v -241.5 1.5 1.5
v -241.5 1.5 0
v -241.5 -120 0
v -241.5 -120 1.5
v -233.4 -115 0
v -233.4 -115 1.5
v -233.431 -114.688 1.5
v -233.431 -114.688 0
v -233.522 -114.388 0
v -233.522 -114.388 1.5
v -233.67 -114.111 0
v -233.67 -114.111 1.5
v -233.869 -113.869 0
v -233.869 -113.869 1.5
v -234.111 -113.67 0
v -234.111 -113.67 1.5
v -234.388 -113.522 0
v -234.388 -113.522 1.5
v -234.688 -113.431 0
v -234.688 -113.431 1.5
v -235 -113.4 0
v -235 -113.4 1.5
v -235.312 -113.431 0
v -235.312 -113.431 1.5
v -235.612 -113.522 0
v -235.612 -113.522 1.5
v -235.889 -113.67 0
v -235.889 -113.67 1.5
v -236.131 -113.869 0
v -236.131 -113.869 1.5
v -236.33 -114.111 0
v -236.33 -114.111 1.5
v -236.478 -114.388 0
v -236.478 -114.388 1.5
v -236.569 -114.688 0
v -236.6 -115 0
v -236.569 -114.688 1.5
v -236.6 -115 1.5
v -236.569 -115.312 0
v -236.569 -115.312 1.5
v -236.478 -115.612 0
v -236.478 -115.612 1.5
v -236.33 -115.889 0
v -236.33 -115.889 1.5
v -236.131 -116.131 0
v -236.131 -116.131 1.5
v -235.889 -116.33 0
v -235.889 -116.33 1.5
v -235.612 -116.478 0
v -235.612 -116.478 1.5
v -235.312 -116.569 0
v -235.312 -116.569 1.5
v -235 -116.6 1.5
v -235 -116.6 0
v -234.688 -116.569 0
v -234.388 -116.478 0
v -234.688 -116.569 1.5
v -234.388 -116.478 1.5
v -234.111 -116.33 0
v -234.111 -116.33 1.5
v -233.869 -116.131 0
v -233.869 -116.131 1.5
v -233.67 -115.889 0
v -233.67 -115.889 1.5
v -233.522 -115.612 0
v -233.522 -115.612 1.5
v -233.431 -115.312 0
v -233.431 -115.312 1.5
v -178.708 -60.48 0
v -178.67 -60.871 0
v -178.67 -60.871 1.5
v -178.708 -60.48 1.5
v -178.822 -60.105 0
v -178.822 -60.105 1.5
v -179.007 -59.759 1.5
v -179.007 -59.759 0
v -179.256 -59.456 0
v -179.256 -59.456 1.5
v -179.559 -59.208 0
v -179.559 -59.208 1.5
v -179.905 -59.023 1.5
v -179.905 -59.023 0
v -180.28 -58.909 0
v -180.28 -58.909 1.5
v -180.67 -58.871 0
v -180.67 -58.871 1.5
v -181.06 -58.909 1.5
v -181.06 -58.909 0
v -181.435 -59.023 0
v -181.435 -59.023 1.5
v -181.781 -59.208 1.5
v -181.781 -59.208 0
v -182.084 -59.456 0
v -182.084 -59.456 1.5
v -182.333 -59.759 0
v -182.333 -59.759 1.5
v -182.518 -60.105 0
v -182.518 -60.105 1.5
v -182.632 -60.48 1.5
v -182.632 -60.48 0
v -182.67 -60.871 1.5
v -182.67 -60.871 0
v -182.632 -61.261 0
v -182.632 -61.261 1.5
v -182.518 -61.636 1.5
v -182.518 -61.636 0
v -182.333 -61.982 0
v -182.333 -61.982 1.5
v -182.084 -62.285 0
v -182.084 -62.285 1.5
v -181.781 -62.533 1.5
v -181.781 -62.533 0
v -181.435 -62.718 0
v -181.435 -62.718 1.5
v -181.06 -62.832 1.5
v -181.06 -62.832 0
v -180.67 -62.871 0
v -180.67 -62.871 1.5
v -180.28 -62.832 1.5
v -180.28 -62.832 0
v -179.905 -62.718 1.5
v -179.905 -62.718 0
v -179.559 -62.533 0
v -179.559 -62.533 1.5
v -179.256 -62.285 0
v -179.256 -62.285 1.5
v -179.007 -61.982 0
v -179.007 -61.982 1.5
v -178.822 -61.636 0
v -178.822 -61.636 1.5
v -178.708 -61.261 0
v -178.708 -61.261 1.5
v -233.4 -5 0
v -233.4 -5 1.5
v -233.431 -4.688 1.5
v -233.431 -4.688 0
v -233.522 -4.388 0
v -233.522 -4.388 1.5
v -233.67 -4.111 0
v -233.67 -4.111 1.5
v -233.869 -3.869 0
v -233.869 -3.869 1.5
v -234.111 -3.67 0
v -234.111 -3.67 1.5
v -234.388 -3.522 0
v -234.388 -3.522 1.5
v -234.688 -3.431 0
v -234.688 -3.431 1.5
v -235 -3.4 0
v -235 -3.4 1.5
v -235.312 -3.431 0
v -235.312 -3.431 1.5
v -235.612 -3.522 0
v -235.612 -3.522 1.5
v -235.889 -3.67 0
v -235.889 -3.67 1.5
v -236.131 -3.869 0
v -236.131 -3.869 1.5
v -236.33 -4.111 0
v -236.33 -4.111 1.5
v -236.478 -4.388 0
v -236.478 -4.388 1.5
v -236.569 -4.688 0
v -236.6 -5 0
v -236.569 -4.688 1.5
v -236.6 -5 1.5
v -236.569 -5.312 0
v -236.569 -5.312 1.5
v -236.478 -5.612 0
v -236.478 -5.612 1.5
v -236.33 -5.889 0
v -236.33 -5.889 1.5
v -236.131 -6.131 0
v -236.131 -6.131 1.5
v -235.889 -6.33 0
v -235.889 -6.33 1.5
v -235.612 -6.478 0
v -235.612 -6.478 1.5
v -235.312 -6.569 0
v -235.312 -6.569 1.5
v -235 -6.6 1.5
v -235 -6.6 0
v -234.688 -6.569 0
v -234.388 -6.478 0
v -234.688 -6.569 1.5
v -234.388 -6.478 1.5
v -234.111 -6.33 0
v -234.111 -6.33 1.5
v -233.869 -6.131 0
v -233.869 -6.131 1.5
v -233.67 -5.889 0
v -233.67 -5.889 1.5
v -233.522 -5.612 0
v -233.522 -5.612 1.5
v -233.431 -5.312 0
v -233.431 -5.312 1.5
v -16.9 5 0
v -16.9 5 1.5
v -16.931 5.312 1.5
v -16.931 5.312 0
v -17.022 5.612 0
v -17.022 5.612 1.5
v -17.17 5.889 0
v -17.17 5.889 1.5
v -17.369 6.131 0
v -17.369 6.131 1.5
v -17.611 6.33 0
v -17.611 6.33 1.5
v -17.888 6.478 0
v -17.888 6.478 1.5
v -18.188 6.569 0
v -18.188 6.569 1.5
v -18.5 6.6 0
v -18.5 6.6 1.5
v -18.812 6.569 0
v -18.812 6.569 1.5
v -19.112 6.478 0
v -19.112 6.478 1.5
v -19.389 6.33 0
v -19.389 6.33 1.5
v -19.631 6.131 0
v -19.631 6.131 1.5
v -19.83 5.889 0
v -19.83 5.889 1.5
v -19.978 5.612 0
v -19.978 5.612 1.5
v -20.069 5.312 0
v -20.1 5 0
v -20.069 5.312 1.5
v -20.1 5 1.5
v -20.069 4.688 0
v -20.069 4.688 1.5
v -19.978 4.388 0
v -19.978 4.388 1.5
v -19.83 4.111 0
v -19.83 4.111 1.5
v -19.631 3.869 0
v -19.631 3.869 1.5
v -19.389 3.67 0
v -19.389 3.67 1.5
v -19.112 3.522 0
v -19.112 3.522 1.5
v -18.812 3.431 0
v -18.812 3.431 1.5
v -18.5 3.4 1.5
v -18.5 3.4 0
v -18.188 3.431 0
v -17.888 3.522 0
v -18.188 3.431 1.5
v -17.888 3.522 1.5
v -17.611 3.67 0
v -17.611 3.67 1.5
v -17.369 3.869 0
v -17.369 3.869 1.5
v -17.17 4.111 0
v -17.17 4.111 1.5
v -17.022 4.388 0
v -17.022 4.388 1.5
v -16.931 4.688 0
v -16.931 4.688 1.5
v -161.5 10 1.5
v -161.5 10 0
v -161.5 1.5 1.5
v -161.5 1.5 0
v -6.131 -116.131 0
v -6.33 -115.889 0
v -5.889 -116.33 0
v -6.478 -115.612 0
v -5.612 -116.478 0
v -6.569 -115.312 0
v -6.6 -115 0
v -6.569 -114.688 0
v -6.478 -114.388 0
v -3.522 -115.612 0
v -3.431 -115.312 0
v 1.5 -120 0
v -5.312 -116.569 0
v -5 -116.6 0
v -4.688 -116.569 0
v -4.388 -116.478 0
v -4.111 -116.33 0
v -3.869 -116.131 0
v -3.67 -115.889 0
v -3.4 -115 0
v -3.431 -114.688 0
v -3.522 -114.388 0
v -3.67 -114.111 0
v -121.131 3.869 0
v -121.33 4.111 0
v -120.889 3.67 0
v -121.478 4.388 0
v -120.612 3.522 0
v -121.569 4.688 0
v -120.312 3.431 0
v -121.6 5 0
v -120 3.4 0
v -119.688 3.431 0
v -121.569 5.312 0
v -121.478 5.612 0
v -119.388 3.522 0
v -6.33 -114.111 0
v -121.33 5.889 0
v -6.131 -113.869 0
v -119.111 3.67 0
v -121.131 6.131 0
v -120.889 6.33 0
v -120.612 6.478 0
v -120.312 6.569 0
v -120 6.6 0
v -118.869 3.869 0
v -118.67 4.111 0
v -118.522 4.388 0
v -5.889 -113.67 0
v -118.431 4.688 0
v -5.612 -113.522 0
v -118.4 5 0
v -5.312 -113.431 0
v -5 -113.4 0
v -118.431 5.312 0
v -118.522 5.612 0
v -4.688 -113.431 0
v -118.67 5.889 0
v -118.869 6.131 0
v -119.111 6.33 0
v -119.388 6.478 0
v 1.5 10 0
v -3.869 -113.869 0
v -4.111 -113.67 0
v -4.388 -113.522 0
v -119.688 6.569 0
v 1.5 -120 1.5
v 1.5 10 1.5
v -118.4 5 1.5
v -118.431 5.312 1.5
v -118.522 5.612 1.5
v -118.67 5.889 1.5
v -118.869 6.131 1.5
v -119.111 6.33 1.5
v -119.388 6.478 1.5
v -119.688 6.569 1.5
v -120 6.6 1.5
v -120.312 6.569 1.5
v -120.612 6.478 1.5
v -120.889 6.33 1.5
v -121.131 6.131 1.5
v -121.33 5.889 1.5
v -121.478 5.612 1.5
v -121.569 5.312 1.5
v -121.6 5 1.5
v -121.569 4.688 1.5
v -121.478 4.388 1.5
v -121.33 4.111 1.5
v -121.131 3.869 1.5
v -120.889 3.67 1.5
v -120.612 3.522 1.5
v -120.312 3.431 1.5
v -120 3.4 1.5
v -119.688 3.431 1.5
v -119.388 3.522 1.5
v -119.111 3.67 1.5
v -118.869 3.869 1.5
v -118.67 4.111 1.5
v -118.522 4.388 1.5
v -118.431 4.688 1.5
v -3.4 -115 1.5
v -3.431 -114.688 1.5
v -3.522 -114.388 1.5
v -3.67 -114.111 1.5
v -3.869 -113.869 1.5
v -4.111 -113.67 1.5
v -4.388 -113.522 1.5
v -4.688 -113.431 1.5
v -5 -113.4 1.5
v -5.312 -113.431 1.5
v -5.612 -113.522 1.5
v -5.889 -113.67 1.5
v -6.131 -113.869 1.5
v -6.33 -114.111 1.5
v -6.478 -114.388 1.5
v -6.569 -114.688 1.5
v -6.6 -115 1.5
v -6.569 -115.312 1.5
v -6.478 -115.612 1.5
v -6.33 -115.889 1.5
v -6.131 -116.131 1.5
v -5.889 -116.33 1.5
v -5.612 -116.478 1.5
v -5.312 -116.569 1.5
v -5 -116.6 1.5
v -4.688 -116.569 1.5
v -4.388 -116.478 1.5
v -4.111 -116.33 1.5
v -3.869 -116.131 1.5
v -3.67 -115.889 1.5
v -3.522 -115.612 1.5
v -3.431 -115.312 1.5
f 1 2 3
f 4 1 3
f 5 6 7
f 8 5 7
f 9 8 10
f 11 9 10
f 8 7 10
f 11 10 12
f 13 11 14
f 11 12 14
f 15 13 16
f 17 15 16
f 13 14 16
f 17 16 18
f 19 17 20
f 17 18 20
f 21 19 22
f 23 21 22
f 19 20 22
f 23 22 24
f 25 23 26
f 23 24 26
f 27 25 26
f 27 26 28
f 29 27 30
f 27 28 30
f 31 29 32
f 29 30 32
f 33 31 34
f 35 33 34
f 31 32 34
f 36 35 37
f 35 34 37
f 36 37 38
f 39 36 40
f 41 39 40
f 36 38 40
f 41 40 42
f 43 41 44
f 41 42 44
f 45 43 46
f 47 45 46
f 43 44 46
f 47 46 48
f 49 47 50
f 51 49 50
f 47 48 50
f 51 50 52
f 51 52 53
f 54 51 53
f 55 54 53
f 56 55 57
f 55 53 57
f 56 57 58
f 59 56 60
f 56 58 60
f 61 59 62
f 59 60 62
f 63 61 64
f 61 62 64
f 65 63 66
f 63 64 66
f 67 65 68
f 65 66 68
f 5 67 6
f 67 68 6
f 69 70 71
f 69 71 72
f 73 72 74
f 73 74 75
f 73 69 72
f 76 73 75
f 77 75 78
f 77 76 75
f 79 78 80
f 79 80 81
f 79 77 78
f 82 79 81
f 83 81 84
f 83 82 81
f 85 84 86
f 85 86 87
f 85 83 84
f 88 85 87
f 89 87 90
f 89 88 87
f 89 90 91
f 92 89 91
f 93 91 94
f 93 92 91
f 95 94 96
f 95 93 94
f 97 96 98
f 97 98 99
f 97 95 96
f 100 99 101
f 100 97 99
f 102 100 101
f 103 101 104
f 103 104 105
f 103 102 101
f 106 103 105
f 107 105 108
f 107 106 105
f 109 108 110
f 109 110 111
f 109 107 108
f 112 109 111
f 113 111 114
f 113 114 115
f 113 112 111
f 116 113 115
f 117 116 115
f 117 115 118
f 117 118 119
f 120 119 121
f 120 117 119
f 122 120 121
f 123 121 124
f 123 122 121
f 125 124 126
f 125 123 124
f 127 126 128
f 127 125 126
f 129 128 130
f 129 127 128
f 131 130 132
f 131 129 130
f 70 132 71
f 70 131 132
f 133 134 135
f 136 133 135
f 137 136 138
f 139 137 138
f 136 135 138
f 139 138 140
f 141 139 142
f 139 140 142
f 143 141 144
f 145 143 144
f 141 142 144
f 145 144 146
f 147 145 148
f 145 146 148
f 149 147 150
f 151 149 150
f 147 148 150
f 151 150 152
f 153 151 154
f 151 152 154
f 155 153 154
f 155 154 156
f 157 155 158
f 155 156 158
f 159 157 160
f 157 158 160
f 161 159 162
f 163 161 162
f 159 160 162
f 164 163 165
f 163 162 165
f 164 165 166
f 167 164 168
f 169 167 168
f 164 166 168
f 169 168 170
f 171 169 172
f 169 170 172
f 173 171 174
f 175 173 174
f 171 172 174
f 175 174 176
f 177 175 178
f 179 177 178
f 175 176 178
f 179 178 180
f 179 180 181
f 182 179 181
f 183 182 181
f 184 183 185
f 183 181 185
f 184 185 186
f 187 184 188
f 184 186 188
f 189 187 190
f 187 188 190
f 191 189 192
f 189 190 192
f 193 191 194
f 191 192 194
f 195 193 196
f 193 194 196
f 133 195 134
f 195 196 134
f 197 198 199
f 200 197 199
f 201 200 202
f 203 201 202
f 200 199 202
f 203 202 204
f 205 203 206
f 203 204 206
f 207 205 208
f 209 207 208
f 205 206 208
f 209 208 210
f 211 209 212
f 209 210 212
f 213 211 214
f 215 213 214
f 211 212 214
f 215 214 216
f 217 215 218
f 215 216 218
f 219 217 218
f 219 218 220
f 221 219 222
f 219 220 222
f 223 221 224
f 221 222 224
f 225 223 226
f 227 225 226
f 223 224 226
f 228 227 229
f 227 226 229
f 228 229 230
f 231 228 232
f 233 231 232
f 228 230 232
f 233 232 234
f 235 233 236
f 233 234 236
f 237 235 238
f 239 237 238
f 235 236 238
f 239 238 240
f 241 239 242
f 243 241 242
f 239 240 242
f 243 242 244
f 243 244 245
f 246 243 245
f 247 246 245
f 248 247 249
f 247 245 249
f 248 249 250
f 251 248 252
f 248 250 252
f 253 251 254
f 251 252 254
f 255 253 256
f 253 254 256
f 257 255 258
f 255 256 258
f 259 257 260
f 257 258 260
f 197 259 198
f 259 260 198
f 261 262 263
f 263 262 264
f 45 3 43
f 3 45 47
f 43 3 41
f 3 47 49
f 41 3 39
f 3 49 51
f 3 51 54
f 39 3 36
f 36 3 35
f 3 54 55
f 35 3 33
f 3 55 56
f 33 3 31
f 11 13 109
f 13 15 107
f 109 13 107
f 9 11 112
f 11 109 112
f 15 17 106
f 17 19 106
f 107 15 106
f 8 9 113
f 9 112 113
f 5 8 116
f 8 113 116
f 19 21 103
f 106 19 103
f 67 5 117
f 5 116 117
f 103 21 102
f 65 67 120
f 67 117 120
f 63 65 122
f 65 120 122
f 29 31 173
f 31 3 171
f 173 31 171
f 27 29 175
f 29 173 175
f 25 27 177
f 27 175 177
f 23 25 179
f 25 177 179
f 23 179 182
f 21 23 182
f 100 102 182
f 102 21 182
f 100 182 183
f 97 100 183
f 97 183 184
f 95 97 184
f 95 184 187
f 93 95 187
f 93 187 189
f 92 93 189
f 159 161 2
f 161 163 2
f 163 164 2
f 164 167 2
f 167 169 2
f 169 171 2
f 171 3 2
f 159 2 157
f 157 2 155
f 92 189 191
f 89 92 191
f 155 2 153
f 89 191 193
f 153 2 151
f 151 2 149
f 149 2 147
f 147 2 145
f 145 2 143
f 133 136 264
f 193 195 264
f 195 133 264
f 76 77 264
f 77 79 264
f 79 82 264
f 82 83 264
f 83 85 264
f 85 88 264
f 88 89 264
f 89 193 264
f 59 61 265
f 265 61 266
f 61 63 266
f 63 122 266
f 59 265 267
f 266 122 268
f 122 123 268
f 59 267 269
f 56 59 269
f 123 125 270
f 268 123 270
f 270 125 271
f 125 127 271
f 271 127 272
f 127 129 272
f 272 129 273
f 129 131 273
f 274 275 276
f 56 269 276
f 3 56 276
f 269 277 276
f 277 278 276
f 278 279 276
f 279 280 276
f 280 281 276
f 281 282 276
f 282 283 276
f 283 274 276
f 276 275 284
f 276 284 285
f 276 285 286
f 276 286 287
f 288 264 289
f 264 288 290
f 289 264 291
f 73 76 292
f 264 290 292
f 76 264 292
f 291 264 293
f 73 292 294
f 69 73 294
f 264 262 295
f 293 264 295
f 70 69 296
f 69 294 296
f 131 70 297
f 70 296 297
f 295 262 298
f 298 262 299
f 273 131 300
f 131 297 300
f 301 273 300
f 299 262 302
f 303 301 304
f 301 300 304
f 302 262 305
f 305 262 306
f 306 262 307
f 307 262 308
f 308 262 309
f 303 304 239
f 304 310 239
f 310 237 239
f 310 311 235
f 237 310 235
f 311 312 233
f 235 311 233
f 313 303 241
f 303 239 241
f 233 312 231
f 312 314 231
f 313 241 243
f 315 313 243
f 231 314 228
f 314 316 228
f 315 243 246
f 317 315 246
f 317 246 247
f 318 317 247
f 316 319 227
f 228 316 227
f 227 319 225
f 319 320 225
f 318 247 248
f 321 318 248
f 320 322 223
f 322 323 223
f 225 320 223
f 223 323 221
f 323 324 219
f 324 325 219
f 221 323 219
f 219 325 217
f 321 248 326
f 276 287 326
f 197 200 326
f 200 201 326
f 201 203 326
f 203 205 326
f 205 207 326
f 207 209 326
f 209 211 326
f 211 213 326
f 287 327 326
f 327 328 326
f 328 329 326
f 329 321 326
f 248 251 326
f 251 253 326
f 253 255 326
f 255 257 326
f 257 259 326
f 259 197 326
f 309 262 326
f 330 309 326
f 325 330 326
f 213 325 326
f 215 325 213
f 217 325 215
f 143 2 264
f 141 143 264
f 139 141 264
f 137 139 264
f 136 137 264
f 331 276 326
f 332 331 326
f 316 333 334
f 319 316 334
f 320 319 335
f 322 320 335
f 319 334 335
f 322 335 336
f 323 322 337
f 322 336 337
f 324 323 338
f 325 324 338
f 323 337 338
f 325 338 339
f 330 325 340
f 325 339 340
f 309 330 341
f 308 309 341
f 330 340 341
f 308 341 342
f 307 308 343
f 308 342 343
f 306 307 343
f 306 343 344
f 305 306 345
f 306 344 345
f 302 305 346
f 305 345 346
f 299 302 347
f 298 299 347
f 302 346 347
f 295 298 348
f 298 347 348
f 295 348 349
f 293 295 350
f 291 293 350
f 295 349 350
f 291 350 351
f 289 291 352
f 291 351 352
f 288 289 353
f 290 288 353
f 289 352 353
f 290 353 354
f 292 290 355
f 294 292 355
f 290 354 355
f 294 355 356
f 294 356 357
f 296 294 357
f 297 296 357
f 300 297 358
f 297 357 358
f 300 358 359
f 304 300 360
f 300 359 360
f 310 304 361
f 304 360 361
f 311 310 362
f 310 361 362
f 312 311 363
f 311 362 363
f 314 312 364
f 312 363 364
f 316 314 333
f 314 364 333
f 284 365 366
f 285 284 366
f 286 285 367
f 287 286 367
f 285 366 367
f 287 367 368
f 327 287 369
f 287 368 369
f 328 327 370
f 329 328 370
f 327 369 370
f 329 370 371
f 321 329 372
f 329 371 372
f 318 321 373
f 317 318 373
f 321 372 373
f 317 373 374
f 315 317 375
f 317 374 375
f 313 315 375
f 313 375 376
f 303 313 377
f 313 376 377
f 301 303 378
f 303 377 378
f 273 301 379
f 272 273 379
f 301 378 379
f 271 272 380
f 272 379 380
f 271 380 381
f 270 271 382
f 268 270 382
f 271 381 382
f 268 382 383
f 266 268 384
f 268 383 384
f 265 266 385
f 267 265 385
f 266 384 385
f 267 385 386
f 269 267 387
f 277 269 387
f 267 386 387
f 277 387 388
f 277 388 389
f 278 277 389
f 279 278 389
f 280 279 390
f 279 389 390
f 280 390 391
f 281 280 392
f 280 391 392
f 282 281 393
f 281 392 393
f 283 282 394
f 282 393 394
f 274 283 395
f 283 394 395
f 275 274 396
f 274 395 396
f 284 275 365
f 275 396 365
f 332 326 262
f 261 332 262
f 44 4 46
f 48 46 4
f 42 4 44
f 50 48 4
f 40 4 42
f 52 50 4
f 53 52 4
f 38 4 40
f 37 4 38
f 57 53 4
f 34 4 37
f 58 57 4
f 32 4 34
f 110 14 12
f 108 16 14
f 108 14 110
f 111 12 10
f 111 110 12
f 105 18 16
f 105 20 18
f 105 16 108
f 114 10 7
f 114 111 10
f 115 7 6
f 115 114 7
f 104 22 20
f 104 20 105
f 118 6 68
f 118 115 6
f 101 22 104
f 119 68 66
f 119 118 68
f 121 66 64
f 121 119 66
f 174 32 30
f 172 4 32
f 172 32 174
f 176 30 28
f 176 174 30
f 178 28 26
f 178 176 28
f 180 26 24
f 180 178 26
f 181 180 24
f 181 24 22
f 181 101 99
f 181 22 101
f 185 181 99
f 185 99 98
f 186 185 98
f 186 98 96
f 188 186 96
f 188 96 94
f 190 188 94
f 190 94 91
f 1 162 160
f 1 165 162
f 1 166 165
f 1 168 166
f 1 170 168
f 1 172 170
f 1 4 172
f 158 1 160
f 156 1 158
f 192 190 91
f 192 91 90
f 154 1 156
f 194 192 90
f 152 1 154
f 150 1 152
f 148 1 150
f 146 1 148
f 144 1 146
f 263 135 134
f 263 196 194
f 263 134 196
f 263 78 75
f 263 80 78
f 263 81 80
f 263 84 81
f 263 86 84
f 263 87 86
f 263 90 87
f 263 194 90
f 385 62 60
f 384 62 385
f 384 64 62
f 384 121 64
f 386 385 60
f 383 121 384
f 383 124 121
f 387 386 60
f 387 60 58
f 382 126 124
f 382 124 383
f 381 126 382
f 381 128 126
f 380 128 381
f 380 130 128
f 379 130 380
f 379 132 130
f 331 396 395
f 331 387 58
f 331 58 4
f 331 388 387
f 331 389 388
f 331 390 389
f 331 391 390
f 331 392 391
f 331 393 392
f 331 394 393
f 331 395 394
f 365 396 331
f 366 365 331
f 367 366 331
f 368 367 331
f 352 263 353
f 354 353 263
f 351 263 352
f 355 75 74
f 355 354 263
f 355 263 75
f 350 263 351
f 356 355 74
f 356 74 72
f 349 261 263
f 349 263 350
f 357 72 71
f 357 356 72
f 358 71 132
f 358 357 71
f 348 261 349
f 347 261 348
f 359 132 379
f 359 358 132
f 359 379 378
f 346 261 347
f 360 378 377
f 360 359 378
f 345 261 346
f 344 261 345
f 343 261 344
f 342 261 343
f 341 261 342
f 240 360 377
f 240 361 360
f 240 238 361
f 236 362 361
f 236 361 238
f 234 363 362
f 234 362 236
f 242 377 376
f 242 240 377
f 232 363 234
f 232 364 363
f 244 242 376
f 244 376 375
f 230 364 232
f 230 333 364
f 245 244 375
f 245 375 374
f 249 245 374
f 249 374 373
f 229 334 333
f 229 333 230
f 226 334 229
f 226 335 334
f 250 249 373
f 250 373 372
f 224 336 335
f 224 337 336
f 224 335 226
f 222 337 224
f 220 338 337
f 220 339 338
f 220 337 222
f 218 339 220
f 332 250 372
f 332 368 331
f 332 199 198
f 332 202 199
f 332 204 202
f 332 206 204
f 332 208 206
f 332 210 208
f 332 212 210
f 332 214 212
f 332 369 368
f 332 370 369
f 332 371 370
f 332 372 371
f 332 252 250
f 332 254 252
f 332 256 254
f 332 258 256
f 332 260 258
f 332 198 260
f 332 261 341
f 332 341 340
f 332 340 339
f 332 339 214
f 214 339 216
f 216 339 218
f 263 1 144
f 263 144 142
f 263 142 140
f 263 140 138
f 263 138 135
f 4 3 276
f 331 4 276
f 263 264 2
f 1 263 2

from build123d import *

# Parameters (mm, degrees)
SKETCH1_R           = 2
BOSS_EXTRUDE1_DEPTH = 1.5
SKETCH2_R           = 1.6
CUT_EXTRUDE1_DEPTH  = 1.5


with BuildPart() as part:
    # Sketch1 → Boss-Extrude1 (new body)
    with BuildSketch(Plane.XY):
        Polygon((-241.5, -120), (1.5, -120), (1.5, 10), (-161.5, 10), (-161.5, 1.5), (-241.5, 1.5), align=None)
        with Locations((-180.669950037, -60.870517352)):
            Circle(SKETCH1_R, mode=Mode.SUBTRACT)
    extrude(amount=BOSS_EXTRUDE1_DEPTH)

    # Sketch2 → Cut-Extrude1 (cut)
    with BuildSketch(Plane.XY.offset(1.5)):
        with Locations((-235, -5)):
            Circle(SKETCH2_R)
        with Locations((-235, -115)):
            Circle(SKETCH2_R)
        with Locations((-5, -115)):
            Circle(SKETCH2_R)
        with Locations((-120, 5)):
            Circle(SKETCH2_R)
        with Locations((-18.5, 5)):
            Circle(SKETCH2_R)
    extrude(amount=-CUT_EXTRUDE1_DEPTH, mode=Mode.SUBTRACT)


solid = part.part
